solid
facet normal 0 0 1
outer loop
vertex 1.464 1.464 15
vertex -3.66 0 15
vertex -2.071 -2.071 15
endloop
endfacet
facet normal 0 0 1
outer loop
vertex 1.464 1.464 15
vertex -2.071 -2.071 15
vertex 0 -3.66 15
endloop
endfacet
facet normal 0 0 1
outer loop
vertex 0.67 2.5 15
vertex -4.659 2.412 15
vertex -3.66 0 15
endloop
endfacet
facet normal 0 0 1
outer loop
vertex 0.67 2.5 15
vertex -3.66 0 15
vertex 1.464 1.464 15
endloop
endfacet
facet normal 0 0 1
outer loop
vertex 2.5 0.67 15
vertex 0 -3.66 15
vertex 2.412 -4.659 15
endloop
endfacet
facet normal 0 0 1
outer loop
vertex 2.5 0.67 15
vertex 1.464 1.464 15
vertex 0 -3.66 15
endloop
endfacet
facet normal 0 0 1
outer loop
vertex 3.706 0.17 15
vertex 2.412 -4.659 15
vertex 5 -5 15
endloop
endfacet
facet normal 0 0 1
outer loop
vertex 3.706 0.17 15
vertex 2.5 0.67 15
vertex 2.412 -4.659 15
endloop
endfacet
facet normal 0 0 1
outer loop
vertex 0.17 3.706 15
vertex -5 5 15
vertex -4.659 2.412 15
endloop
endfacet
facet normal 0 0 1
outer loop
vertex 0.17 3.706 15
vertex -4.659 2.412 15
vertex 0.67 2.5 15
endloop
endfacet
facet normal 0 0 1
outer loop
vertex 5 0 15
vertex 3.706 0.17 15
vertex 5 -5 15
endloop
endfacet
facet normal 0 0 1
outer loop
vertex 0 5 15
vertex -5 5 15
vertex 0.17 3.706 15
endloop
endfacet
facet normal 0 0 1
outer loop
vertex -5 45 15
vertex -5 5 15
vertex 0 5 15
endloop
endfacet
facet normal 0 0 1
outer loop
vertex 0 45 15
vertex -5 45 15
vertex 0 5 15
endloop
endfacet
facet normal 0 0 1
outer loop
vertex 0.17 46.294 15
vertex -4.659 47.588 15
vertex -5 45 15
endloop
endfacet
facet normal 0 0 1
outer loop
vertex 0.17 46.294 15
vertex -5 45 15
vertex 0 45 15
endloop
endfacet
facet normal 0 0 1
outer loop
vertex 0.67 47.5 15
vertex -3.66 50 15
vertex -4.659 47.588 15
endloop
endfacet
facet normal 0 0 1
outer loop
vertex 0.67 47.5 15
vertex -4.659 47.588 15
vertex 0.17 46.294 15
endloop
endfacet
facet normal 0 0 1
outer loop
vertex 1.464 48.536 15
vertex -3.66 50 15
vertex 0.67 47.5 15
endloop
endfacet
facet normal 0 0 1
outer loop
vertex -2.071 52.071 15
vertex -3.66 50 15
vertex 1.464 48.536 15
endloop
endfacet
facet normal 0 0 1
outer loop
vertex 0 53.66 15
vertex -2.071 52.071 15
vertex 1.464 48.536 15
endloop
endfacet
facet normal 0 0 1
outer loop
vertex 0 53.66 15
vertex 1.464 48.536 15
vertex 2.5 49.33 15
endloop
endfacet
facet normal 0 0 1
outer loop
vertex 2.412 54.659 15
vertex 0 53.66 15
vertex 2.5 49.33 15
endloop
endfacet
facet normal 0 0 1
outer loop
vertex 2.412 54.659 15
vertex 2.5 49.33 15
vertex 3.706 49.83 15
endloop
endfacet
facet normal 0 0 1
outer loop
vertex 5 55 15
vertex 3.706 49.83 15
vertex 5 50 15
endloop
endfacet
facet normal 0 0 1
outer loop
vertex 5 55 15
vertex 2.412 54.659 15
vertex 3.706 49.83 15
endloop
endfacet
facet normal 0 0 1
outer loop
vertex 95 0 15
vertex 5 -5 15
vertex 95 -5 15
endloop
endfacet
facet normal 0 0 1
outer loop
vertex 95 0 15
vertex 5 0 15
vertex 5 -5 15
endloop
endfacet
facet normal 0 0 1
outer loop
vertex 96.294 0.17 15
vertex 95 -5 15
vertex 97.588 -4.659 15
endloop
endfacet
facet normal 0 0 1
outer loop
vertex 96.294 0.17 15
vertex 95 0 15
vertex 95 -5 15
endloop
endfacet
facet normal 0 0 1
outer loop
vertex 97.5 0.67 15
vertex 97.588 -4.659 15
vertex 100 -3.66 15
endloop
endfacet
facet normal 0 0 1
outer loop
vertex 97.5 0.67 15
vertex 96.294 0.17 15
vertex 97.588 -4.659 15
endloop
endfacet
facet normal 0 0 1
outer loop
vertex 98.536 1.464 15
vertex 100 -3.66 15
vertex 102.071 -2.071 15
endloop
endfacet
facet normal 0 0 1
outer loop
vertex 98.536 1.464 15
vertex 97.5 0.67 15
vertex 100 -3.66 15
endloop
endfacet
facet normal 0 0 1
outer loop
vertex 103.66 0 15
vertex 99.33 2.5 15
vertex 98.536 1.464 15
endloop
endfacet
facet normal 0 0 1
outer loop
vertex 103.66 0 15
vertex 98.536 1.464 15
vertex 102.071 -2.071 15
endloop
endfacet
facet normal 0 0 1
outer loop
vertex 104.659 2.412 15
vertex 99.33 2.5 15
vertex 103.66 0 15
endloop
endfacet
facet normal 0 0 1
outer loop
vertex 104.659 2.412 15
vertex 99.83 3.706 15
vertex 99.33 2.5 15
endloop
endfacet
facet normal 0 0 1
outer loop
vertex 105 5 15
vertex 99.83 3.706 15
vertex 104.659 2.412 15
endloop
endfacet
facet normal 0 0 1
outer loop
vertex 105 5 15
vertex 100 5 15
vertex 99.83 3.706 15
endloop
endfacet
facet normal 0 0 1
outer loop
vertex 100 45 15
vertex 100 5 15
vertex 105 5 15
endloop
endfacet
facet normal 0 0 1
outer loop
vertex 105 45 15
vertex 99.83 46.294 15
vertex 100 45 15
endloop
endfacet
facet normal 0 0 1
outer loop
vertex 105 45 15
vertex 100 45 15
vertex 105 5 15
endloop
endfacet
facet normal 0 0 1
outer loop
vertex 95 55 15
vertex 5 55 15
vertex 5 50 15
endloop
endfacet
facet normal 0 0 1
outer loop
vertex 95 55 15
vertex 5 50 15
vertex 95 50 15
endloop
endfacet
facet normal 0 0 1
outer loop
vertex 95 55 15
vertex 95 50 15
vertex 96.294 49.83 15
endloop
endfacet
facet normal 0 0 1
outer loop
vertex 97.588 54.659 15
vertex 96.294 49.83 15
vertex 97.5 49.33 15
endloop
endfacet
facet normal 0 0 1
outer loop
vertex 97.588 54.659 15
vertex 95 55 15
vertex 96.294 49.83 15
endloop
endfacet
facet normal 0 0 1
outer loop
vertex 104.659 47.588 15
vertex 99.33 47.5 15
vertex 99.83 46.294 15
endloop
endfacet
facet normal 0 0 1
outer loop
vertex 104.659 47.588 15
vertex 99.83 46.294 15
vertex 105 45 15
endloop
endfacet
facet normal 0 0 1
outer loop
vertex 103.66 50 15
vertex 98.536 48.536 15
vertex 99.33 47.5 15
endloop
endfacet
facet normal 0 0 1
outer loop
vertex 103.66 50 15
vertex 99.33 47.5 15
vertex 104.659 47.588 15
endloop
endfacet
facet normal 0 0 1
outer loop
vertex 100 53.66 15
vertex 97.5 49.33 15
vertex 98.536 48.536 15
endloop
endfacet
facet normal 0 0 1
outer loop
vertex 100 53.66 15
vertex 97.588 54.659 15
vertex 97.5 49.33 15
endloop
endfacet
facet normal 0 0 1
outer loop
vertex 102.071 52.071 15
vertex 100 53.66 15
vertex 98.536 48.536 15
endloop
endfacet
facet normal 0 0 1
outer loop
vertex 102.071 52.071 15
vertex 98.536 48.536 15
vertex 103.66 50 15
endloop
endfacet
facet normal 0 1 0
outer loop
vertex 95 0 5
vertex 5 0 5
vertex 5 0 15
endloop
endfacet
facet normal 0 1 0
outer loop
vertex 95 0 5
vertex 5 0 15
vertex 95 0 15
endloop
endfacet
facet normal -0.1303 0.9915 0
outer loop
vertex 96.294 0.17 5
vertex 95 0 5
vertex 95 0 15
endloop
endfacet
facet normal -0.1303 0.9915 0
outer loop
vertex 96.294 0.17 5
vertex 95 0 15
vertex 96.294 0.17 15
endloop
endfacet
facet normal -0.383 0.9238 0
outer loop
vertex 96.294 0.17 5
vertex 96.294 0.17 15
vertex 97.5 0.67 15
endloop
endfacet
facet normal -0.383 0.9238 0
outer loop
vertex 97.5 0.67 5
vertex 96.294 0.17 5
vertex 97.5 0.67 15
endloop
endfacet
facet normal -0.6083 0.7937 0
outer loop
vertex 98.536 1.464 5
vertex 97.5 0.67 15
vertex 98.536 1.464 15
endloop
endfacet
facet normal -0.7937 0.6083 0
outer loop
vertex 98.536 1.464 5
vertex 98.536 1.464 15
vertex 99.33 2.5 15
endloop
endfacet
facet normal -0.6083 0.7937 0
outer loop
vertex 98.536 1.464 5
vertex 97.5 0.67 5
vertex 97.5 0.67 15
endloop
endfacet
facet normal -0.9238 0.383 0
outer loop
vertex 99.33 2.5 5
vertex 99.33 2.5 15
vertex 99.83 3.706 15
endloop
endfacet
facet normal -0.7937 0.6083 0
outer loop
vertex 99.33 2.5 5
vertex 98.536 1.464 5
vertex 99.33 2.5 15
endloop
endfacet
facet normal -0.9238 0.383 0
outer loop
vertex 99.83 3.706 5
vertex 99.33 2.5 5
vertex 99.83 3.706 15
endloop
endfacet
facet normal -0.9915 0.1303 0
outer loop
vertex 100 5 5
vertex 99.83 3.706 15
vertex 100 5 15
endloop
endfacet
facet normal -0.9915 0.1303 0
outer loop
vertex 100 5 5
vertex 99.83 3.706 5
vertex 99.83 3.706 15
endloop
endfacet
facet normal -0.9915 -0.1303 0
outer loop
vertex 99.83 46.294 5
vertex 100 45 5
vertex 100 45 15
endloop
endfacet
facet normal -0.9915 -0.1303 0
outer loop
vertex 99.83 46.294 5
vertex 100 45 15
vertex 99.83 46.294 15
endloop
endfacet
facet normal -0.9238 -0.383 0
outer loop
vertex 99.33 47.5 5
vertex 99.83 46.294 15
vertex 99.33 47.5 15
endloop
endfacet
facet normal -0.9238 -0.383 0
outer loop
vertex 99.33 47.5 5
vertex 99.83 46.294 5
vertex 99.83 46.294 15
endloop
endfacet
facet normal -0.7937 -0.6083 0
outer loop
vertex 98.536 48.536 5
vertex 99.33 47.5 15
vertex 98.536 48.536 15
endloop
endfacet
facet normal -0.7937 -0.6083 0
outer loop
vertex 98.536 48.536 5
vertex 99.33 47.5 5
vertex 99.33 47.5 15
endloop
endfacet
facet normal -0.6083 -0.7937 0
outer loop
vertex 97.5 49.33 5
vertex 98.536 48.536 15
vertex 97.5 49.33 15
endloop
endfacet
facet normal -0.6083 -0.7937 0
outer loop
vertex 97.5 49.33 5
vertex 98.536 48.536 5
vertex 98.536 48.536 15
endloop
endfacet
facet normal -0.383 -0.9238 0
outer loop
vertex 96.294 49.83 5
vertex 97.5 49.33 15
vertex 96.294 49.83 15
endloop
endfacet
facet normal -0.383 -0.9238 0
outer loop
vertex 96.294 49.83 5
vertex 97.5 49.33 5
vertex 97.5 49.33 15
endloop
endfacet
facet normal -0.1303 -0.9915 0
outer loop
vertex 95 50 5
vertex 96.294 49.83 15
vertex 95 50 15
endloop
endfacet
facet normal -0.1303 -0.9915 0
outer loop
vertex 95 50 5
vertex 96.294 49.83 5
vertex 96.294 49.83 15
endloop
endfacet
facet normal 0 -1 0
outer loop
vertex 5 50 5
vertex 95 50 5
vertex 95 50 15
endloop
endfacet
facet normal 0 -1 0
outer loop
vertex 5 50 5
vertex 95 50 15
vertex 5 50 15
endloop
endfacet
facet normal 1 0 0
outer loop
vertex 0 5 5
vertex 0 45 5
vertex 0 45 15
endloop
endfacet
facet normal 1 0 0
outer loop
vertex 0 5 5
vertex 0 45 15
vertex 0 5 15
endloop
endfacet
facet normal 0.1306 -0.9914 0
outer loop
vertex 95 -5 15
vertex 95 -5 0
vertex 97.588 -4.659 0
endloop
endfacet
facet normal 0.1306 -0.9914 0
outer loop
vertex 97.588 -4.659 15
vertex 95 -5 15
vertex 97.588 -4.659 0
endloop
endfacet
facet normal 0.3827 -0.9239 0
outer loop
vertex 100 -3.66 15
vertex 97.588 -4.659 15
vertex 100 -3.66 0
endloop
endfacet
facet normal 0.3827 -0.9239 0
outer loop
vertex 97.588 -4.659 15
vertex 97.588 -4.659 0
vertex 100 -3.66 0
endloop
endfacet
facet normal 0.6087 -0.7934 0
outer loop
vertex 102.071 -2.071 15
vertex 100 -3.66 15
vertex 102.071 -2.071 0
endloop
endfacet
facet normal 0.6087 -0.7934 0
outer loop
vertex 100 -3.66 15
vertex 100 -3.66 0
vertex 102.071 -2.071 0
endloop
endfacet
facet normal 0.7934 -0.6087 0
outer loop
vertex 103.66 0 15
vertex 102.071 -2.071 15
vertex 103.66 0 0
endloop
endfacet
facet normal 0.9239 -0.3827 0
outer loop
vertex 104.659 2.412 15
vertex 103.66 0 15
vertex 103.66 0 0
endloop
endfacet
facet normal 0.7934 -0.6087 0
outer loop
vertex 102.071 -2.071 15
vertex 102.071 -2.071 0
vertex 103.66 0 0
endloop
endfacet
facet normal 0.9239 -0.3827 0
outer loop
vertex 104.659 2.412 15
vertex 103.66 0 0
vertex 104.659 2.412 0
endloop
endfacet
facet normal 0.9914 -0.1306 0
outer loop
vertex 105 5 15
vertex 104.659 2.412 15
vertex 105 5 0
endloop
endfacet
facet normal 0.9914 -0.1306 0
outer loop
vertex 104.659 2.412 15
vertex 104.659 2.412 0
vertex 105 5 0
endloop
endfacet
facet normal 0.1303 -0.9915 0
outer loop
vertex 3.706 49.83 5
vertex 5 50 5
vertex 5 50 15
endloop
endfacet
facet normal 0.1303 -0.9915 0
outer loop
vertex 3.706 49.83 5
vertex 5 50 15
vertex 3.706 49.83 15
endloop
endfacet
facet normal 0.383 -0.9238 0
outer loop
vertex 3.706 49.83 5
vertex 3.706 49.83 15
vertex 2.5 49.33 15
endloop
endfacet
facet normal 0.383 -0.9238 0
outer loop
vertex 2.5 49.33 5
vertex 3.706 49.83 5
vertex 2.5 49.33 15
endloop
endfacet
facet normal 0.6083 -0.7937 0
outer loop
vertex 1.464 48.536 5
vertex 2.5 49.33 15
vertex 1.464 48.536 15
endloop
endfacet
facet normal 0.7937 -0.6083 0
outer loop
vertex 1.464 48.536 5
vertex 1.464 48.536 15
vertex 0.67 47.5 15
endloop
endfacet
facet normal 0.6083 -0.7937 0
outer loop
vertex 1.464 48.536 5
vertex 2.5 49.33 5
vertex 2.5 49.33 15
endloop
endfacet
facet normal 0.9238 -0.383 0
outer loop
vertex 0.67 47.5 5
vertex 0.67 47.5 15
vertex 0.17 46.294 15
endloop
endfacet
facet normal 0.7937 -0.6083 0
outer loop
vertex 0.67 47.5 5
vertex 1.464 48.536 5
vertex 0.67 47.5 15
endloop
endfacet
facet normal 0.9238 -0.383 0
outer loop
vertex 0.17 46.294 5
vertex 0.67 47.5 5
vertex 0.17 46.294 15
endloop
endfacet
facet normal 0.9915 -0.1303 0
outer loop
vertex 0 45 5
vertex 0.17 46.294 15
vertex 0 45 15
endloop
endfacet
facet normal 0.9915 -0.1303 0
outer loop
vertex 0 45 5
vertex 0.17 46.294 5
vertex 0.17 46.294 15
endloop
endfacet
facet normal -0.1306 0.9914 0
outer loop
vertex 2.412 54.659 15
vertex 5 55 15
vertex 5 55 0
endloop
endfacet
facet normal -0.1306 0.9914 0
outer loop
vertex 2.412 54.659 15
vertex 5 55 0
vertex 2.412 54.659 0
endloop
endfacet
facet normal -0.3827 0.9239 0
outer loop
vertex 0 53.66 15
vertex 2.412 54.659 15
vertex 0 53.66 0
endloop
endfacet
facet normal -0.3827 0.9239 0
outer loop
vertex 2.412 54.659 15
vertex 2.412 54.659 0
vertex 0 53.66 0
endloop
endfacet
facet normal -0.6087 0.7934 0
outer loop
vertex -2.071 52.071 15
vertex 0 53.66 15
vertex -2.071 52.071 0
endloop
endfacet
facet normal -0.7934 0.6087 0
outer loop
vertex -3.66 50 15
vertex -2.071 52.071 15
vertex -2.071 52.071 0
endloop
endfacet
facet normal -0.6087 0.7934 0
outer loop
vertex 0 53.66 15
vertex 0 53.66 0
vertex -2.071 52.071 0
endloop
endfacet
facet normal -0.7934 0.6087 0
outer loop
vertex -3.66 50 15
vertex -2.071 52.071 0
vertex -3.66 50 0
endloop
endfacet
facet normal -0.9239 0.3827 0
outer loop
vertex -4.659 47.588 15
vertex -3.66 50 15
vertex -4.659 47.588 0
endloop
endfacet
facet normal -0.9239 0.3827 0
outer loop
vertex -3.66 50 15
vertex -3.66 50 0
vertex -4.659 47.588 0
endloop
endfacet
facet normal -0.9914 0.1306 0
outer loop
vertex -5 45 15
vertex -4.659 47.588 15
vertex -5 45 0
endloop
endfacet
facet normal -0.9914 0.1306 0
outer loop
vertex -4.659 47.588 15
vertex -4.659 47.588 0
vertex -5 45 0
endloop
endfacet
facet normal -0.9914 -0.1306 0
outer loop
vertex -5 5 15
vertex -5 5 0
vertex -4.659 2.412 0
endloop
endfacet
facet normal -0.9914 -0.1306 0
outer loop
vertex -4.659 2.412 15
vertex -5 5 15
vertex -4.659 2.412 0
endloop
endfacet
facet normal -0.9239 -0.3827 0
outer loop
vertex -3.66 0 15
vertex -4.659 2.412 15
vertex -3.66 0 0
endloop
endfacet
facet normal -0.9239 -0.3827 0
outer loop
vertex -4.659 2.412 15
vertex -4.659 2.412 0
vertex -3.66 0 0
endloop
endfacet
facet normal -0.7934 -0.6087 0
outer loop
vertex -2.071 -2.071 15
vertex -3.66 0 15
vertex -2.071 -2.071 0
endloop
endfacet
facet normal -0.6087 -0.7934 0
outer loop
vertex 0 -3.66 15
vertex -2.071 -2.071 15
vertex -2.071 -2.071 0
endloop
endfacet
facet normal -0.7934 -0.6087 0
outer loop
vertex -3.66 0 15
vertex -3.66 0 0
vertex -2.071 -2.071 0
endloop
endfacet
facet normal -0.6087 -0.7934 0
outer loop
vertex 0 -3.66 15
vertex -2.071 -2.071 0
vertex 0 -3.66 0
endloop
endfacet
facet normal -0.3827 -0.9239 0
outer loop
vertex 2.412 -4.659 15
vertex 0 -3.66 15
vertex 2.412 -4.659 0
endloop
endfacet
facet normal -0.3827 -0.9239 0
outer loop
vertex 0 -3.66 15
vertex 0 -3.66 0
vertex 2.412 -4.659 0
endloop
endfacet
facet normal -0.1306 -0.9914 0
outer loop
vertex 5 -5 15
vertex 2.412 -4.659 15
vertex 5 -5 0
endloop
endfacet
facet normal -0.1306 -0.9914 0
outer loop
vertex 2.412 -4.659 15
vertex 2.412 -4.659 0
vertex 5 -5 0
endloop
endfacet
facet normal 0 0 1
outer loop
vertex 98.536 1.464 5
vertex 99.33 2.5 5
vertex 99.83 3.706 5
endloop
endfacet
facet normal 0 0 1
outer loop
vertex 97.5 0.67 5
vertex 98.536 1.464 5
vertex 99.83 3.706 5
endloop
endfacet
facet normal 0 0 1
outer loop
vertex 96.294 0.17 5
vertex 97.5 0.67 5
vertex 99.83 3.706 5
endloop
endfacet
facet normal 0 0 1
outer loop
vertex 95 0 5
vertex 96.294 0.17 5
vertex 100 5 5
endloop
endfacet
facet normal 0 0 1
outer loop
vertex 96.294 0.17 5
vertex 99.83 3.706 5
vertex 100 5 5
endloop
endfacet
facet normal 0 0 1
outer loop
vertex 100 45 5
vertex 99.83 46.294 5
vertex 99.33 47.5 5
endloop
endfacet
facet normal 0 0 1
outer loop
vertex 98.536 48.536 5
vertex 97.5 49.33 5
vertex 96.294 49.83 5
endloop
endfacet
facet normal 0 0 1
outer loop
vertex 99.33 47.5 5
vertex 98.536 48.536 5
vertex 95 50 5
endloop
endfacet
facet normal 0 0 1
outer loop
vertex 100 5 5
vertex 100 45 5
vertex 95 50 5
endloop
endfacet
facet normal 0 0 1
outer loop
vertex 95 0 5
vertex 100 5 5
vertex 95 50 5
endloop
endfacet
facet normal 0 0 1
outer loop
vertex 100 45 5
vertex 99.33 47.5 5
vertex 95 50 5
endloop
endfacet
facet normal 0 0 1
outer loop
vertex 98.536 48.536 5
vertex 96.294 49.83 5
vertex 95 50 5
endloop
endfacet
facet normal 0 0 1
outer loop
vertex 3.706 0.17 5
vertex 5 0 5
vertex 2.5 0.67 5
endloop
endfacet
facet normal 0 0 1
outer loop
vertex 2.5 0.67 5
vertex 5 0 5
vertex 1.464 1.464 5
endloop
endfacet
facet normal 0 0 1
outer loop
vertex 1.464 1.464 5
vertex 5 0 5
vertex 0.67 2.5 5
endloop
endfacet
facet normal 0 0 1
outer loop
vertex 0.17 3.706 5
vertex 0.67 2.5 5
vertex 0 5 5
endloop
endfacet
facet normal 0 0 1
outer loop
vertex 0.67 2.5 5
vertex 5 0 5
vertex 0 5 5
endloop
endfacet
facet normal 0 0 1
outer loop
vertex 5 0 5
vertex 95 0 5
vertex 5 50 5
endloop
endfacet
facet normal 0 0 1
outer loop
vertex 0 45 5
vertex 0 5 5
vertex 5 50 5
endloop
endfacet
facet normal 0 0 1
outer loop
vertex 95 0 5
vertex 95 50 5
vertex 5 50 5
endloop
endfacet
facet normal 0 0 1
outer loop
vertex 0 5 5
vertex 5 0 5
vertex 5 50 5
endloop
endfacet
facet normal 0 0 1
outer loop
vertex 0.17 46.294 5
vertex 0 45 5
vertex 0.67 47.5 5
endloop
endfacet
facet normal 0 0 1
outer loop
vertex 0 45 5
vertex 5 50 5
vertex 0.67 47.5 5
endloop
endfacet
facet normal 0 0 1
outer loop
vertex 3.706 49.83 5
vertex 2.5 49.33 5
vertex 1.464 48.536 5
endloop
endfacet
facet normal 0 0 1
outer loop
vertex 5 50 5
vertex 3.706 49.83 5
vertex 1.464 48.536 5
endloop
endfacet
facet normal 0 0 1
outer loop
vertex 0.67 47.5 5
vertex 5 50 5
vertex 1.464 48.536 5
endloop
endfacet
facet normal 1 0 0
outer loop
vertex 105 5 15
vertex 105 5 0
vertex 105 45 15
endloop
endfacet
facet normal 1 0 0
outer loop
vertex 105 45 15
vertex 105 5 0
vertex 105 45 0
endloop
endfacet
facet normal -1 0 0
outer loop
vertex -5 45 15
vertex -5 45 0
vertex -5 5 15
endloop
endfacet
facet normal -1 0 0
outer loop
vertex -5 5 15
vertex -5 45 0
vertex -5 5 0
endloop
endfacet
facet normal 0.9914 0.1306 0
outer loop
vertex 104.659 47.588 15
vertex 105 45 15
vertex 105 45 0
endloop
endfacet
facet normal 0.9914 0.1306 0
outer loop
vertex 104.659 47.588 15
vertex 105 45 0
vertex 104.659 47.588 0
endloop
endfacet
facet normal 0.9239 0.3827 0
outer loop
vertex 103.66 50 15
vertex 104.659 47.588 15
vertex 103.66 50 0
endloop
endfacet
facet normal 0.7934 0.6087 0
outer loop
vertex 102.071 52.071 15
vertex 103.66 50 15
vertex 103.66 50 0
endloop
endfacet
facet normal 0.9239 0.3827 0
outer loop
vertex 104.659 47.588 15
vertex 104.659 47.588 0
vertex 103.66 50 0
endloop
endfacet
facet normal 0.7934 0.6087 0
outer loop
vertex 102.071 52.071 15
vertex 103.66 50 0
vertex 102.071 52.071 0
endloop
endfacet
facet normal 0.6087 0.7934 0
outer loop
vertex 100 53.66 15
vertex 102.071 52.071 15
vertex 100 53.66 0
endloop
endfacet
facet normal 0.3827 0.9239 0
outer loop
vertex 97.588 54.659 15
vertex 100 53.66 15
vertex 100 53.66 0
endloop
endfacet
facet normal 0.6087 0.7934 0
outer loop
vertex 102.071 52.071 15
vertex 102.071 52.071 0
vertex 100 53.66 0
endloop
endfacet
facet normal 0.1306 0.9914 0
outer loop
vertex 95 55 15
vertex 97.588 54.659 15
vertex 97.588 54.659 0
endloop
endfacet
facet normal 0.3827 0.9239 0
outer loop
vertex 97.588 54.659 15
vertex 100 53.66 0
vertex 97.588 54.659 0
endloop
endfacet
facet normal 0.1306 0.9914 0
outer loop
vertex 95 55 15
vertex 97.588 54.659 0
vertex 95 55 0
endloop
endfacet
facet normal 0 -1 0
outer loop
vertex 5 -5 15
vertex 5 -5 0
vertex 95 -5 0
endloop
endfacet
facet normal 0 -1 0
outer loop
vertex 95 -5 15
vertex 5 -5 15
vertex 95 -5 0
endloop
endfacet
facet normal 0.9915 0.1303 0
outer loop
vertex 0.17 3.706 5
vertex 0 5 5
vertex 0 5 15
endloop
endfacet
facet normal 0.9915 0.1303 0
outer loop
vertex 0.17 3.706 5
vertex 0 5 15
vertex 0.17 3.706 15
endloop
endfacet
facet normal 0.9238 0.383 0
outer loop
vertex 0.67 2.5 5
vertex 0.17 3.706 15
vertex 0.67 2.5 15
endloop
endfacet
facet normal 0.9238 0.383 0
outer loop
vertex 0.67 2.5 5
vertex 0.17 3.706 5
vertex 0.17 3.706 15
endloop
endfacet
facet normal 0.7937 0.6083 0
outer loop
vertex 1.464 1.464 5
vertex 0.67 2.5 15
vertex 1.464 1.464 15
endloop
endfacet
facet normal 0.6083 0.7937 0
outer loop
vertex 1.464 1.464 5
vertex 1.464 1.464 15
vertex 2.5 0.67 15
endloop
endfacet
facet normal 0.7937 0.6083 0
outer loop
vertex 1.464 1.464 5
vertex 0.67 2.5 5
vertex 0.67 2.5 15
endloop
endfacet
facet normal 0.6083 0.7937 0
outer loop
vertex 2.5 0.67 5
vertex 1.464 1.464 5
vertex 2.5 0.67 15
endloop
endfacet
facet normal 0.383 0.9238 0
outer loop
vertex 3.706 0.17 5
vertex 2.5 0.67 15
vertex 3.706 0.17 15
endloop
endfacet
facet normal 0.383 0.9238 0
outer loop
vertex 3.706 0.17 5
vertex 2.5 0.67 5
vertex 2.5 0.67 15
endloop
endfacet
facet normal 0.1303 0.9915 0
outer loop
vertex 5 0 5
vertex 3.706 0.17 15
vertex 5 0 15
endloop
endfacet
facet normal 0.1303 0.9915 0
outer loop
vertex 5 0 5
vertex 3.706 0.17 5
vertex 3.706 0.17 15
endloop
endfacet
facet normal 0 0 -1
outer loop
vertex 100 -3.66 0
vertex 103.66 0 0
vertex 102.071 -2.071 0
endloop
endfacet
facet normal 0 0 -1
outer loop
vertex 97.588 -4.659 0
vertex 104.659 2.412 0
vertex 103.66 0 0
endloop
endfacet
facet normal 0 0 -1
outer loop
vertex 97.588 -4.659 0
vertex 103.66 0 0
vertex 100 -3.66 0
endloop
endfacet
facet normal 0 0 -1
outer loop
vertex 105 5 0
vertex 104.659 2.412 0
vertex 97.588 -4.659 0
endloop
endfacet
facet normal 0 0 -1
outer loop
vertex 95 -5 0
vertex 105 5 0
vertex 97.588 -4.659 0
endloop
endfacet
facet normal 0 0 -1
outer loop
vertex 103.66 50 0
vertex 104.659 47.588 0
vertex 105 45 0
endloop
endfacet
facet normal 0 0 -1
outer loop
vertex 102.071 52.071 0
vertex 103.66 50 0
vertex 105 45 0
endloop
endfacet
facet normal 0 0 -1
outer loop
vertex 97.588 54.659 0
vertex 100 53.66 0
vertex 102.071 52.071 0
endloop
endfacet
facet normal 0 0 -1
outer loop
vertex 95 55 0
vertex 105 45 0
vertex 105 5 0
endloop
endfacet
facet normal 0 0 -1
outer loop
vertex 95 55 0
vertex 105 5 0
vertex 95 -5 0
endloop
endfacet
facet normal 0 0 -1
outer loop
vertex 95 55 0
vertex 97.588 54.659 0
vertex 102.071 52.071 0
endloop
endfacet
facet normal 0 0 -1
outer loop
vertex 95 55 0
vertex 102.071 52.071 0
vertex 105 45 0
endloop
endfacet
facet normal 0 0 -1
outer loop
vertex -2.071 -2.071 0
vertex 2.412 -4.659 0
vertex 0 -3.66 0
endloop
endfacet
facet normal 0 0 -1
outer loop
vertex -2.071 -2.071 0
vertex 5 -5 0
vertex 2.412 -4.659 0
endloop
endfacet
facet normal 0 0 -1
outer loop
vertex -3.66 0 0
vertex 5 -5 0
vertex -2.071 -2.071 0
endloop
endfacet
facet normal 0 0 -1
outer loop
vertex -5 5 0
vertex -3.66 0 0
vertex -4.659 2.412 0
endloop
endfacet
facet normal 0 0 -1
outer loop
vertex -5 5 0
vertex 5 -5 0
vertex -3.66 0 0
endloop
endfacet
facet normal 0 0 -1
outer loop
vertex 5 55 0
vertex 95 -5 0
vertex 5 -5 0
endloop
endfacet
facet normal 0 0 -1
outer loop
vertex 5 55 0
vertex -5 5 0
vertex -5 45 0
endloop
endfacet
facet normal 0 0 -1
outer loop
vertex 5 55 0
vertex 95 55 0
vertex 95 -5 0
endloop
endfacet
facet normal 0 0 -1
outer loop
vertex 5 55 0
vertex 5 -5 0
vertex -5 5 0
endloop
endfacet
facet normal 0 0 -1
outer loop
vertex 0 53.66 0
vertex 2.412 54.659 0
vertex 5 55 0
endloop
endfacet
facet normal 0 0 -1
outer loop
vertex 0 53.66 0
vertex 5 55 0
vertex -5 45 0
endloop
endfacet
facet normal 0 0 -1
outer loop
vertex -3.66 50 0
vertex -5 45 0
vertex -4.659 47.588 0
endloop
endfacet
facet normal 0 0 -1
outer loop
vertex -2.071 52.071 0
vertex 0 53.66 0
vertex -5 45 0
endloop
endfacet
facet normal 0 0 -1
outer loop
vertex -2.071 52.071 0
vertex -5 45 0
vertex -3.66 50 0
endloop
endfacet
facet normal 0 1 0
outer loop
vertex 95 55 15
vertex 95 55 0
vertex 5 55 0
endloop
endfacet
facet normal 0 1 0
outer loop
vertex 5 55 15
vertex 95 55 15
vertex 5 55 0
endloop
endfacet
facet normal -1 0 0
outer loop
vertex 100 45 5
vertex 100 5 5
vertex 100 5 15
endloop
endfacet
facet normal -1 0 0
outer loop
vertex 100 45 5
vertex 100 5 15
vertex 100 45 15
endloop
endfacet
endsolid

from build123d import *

# Parameters (mm, degrees)
EXTRU_MINCE3_DEPTH = 15
BOSS_EXTRU_2_DEPTH = 5


with BuildPart() as part:
    # Esquisse1 → Extru.-Mince3 (new body)
    with BuildSketch(Plane.XY):
        with BuildLine():
            Line((5, -5), (95, -5))
            ThreePointArc((95, -5), (102.071067812, -2.071067812), (105, 5))
            Line((105, 5), (105, 45))
            ThreePointArc((105, 45), (102.071067812, 52.071067812), (95, 55))
            Line((95, 55), (5, 55))
            ThreePointArc((5, 55), (-2.071067812, 52.071067812), (-5, 45))
            Line((-5, 45), (-5, 5))
            ThreePointArc((-5, 5), (-2.071067812, -2.071067812), (5, -5))
        make_face()
        with BuildLine():
            Line((5, 0), (95, 0))
            ThreePointArc((95, 0), (98.535533906, 1.464466094), (100, 5))
            Line((100, 5), (100, 45))
            ThreePointArc((100, 45), (98.535533906, 48.535533906), (95, 50))
            Line((95, 50), (5, 50))
            ThreePointArc((5, 50), (1.464466094, 48.535533906), (0, 45))
            Line((0, 45), (0, 5))
            ThreePointArc((0, 5), (1.464466094, 1.464466094), (5, 0))
        make_face(mode=Mode.SUBTRACT)
    extrude(amount=EXTRU_MINCE3_DEPTH)

    # Esquisse2 → Boss.-Extru.2 (add)
    with BuildSketch(Plane.XY):
        with BuildLine():
            Line((5, 50), (95, 50))
            ThreePointArc((95, 50), (98.535533906, 48.535533906), (100, 45))
            Line((100, 45), (100, 5))
            ThreePointArc((100, 5), (98.535533906, 1.464466094), (95, 0))
            Line((95, 0), (5, 0))
            ThreePointArc((5, 0), (1.464466094, 1.464466094), (0, 5))
            Line((0, 5), (0, 45))
            ThreePointArc((0, 45), (1.464466094, 48.535533906), (5, 50))
        make_face()
    extrude(amount=BOSS_EXTRU_2_DEPTH)


solid = part.part
